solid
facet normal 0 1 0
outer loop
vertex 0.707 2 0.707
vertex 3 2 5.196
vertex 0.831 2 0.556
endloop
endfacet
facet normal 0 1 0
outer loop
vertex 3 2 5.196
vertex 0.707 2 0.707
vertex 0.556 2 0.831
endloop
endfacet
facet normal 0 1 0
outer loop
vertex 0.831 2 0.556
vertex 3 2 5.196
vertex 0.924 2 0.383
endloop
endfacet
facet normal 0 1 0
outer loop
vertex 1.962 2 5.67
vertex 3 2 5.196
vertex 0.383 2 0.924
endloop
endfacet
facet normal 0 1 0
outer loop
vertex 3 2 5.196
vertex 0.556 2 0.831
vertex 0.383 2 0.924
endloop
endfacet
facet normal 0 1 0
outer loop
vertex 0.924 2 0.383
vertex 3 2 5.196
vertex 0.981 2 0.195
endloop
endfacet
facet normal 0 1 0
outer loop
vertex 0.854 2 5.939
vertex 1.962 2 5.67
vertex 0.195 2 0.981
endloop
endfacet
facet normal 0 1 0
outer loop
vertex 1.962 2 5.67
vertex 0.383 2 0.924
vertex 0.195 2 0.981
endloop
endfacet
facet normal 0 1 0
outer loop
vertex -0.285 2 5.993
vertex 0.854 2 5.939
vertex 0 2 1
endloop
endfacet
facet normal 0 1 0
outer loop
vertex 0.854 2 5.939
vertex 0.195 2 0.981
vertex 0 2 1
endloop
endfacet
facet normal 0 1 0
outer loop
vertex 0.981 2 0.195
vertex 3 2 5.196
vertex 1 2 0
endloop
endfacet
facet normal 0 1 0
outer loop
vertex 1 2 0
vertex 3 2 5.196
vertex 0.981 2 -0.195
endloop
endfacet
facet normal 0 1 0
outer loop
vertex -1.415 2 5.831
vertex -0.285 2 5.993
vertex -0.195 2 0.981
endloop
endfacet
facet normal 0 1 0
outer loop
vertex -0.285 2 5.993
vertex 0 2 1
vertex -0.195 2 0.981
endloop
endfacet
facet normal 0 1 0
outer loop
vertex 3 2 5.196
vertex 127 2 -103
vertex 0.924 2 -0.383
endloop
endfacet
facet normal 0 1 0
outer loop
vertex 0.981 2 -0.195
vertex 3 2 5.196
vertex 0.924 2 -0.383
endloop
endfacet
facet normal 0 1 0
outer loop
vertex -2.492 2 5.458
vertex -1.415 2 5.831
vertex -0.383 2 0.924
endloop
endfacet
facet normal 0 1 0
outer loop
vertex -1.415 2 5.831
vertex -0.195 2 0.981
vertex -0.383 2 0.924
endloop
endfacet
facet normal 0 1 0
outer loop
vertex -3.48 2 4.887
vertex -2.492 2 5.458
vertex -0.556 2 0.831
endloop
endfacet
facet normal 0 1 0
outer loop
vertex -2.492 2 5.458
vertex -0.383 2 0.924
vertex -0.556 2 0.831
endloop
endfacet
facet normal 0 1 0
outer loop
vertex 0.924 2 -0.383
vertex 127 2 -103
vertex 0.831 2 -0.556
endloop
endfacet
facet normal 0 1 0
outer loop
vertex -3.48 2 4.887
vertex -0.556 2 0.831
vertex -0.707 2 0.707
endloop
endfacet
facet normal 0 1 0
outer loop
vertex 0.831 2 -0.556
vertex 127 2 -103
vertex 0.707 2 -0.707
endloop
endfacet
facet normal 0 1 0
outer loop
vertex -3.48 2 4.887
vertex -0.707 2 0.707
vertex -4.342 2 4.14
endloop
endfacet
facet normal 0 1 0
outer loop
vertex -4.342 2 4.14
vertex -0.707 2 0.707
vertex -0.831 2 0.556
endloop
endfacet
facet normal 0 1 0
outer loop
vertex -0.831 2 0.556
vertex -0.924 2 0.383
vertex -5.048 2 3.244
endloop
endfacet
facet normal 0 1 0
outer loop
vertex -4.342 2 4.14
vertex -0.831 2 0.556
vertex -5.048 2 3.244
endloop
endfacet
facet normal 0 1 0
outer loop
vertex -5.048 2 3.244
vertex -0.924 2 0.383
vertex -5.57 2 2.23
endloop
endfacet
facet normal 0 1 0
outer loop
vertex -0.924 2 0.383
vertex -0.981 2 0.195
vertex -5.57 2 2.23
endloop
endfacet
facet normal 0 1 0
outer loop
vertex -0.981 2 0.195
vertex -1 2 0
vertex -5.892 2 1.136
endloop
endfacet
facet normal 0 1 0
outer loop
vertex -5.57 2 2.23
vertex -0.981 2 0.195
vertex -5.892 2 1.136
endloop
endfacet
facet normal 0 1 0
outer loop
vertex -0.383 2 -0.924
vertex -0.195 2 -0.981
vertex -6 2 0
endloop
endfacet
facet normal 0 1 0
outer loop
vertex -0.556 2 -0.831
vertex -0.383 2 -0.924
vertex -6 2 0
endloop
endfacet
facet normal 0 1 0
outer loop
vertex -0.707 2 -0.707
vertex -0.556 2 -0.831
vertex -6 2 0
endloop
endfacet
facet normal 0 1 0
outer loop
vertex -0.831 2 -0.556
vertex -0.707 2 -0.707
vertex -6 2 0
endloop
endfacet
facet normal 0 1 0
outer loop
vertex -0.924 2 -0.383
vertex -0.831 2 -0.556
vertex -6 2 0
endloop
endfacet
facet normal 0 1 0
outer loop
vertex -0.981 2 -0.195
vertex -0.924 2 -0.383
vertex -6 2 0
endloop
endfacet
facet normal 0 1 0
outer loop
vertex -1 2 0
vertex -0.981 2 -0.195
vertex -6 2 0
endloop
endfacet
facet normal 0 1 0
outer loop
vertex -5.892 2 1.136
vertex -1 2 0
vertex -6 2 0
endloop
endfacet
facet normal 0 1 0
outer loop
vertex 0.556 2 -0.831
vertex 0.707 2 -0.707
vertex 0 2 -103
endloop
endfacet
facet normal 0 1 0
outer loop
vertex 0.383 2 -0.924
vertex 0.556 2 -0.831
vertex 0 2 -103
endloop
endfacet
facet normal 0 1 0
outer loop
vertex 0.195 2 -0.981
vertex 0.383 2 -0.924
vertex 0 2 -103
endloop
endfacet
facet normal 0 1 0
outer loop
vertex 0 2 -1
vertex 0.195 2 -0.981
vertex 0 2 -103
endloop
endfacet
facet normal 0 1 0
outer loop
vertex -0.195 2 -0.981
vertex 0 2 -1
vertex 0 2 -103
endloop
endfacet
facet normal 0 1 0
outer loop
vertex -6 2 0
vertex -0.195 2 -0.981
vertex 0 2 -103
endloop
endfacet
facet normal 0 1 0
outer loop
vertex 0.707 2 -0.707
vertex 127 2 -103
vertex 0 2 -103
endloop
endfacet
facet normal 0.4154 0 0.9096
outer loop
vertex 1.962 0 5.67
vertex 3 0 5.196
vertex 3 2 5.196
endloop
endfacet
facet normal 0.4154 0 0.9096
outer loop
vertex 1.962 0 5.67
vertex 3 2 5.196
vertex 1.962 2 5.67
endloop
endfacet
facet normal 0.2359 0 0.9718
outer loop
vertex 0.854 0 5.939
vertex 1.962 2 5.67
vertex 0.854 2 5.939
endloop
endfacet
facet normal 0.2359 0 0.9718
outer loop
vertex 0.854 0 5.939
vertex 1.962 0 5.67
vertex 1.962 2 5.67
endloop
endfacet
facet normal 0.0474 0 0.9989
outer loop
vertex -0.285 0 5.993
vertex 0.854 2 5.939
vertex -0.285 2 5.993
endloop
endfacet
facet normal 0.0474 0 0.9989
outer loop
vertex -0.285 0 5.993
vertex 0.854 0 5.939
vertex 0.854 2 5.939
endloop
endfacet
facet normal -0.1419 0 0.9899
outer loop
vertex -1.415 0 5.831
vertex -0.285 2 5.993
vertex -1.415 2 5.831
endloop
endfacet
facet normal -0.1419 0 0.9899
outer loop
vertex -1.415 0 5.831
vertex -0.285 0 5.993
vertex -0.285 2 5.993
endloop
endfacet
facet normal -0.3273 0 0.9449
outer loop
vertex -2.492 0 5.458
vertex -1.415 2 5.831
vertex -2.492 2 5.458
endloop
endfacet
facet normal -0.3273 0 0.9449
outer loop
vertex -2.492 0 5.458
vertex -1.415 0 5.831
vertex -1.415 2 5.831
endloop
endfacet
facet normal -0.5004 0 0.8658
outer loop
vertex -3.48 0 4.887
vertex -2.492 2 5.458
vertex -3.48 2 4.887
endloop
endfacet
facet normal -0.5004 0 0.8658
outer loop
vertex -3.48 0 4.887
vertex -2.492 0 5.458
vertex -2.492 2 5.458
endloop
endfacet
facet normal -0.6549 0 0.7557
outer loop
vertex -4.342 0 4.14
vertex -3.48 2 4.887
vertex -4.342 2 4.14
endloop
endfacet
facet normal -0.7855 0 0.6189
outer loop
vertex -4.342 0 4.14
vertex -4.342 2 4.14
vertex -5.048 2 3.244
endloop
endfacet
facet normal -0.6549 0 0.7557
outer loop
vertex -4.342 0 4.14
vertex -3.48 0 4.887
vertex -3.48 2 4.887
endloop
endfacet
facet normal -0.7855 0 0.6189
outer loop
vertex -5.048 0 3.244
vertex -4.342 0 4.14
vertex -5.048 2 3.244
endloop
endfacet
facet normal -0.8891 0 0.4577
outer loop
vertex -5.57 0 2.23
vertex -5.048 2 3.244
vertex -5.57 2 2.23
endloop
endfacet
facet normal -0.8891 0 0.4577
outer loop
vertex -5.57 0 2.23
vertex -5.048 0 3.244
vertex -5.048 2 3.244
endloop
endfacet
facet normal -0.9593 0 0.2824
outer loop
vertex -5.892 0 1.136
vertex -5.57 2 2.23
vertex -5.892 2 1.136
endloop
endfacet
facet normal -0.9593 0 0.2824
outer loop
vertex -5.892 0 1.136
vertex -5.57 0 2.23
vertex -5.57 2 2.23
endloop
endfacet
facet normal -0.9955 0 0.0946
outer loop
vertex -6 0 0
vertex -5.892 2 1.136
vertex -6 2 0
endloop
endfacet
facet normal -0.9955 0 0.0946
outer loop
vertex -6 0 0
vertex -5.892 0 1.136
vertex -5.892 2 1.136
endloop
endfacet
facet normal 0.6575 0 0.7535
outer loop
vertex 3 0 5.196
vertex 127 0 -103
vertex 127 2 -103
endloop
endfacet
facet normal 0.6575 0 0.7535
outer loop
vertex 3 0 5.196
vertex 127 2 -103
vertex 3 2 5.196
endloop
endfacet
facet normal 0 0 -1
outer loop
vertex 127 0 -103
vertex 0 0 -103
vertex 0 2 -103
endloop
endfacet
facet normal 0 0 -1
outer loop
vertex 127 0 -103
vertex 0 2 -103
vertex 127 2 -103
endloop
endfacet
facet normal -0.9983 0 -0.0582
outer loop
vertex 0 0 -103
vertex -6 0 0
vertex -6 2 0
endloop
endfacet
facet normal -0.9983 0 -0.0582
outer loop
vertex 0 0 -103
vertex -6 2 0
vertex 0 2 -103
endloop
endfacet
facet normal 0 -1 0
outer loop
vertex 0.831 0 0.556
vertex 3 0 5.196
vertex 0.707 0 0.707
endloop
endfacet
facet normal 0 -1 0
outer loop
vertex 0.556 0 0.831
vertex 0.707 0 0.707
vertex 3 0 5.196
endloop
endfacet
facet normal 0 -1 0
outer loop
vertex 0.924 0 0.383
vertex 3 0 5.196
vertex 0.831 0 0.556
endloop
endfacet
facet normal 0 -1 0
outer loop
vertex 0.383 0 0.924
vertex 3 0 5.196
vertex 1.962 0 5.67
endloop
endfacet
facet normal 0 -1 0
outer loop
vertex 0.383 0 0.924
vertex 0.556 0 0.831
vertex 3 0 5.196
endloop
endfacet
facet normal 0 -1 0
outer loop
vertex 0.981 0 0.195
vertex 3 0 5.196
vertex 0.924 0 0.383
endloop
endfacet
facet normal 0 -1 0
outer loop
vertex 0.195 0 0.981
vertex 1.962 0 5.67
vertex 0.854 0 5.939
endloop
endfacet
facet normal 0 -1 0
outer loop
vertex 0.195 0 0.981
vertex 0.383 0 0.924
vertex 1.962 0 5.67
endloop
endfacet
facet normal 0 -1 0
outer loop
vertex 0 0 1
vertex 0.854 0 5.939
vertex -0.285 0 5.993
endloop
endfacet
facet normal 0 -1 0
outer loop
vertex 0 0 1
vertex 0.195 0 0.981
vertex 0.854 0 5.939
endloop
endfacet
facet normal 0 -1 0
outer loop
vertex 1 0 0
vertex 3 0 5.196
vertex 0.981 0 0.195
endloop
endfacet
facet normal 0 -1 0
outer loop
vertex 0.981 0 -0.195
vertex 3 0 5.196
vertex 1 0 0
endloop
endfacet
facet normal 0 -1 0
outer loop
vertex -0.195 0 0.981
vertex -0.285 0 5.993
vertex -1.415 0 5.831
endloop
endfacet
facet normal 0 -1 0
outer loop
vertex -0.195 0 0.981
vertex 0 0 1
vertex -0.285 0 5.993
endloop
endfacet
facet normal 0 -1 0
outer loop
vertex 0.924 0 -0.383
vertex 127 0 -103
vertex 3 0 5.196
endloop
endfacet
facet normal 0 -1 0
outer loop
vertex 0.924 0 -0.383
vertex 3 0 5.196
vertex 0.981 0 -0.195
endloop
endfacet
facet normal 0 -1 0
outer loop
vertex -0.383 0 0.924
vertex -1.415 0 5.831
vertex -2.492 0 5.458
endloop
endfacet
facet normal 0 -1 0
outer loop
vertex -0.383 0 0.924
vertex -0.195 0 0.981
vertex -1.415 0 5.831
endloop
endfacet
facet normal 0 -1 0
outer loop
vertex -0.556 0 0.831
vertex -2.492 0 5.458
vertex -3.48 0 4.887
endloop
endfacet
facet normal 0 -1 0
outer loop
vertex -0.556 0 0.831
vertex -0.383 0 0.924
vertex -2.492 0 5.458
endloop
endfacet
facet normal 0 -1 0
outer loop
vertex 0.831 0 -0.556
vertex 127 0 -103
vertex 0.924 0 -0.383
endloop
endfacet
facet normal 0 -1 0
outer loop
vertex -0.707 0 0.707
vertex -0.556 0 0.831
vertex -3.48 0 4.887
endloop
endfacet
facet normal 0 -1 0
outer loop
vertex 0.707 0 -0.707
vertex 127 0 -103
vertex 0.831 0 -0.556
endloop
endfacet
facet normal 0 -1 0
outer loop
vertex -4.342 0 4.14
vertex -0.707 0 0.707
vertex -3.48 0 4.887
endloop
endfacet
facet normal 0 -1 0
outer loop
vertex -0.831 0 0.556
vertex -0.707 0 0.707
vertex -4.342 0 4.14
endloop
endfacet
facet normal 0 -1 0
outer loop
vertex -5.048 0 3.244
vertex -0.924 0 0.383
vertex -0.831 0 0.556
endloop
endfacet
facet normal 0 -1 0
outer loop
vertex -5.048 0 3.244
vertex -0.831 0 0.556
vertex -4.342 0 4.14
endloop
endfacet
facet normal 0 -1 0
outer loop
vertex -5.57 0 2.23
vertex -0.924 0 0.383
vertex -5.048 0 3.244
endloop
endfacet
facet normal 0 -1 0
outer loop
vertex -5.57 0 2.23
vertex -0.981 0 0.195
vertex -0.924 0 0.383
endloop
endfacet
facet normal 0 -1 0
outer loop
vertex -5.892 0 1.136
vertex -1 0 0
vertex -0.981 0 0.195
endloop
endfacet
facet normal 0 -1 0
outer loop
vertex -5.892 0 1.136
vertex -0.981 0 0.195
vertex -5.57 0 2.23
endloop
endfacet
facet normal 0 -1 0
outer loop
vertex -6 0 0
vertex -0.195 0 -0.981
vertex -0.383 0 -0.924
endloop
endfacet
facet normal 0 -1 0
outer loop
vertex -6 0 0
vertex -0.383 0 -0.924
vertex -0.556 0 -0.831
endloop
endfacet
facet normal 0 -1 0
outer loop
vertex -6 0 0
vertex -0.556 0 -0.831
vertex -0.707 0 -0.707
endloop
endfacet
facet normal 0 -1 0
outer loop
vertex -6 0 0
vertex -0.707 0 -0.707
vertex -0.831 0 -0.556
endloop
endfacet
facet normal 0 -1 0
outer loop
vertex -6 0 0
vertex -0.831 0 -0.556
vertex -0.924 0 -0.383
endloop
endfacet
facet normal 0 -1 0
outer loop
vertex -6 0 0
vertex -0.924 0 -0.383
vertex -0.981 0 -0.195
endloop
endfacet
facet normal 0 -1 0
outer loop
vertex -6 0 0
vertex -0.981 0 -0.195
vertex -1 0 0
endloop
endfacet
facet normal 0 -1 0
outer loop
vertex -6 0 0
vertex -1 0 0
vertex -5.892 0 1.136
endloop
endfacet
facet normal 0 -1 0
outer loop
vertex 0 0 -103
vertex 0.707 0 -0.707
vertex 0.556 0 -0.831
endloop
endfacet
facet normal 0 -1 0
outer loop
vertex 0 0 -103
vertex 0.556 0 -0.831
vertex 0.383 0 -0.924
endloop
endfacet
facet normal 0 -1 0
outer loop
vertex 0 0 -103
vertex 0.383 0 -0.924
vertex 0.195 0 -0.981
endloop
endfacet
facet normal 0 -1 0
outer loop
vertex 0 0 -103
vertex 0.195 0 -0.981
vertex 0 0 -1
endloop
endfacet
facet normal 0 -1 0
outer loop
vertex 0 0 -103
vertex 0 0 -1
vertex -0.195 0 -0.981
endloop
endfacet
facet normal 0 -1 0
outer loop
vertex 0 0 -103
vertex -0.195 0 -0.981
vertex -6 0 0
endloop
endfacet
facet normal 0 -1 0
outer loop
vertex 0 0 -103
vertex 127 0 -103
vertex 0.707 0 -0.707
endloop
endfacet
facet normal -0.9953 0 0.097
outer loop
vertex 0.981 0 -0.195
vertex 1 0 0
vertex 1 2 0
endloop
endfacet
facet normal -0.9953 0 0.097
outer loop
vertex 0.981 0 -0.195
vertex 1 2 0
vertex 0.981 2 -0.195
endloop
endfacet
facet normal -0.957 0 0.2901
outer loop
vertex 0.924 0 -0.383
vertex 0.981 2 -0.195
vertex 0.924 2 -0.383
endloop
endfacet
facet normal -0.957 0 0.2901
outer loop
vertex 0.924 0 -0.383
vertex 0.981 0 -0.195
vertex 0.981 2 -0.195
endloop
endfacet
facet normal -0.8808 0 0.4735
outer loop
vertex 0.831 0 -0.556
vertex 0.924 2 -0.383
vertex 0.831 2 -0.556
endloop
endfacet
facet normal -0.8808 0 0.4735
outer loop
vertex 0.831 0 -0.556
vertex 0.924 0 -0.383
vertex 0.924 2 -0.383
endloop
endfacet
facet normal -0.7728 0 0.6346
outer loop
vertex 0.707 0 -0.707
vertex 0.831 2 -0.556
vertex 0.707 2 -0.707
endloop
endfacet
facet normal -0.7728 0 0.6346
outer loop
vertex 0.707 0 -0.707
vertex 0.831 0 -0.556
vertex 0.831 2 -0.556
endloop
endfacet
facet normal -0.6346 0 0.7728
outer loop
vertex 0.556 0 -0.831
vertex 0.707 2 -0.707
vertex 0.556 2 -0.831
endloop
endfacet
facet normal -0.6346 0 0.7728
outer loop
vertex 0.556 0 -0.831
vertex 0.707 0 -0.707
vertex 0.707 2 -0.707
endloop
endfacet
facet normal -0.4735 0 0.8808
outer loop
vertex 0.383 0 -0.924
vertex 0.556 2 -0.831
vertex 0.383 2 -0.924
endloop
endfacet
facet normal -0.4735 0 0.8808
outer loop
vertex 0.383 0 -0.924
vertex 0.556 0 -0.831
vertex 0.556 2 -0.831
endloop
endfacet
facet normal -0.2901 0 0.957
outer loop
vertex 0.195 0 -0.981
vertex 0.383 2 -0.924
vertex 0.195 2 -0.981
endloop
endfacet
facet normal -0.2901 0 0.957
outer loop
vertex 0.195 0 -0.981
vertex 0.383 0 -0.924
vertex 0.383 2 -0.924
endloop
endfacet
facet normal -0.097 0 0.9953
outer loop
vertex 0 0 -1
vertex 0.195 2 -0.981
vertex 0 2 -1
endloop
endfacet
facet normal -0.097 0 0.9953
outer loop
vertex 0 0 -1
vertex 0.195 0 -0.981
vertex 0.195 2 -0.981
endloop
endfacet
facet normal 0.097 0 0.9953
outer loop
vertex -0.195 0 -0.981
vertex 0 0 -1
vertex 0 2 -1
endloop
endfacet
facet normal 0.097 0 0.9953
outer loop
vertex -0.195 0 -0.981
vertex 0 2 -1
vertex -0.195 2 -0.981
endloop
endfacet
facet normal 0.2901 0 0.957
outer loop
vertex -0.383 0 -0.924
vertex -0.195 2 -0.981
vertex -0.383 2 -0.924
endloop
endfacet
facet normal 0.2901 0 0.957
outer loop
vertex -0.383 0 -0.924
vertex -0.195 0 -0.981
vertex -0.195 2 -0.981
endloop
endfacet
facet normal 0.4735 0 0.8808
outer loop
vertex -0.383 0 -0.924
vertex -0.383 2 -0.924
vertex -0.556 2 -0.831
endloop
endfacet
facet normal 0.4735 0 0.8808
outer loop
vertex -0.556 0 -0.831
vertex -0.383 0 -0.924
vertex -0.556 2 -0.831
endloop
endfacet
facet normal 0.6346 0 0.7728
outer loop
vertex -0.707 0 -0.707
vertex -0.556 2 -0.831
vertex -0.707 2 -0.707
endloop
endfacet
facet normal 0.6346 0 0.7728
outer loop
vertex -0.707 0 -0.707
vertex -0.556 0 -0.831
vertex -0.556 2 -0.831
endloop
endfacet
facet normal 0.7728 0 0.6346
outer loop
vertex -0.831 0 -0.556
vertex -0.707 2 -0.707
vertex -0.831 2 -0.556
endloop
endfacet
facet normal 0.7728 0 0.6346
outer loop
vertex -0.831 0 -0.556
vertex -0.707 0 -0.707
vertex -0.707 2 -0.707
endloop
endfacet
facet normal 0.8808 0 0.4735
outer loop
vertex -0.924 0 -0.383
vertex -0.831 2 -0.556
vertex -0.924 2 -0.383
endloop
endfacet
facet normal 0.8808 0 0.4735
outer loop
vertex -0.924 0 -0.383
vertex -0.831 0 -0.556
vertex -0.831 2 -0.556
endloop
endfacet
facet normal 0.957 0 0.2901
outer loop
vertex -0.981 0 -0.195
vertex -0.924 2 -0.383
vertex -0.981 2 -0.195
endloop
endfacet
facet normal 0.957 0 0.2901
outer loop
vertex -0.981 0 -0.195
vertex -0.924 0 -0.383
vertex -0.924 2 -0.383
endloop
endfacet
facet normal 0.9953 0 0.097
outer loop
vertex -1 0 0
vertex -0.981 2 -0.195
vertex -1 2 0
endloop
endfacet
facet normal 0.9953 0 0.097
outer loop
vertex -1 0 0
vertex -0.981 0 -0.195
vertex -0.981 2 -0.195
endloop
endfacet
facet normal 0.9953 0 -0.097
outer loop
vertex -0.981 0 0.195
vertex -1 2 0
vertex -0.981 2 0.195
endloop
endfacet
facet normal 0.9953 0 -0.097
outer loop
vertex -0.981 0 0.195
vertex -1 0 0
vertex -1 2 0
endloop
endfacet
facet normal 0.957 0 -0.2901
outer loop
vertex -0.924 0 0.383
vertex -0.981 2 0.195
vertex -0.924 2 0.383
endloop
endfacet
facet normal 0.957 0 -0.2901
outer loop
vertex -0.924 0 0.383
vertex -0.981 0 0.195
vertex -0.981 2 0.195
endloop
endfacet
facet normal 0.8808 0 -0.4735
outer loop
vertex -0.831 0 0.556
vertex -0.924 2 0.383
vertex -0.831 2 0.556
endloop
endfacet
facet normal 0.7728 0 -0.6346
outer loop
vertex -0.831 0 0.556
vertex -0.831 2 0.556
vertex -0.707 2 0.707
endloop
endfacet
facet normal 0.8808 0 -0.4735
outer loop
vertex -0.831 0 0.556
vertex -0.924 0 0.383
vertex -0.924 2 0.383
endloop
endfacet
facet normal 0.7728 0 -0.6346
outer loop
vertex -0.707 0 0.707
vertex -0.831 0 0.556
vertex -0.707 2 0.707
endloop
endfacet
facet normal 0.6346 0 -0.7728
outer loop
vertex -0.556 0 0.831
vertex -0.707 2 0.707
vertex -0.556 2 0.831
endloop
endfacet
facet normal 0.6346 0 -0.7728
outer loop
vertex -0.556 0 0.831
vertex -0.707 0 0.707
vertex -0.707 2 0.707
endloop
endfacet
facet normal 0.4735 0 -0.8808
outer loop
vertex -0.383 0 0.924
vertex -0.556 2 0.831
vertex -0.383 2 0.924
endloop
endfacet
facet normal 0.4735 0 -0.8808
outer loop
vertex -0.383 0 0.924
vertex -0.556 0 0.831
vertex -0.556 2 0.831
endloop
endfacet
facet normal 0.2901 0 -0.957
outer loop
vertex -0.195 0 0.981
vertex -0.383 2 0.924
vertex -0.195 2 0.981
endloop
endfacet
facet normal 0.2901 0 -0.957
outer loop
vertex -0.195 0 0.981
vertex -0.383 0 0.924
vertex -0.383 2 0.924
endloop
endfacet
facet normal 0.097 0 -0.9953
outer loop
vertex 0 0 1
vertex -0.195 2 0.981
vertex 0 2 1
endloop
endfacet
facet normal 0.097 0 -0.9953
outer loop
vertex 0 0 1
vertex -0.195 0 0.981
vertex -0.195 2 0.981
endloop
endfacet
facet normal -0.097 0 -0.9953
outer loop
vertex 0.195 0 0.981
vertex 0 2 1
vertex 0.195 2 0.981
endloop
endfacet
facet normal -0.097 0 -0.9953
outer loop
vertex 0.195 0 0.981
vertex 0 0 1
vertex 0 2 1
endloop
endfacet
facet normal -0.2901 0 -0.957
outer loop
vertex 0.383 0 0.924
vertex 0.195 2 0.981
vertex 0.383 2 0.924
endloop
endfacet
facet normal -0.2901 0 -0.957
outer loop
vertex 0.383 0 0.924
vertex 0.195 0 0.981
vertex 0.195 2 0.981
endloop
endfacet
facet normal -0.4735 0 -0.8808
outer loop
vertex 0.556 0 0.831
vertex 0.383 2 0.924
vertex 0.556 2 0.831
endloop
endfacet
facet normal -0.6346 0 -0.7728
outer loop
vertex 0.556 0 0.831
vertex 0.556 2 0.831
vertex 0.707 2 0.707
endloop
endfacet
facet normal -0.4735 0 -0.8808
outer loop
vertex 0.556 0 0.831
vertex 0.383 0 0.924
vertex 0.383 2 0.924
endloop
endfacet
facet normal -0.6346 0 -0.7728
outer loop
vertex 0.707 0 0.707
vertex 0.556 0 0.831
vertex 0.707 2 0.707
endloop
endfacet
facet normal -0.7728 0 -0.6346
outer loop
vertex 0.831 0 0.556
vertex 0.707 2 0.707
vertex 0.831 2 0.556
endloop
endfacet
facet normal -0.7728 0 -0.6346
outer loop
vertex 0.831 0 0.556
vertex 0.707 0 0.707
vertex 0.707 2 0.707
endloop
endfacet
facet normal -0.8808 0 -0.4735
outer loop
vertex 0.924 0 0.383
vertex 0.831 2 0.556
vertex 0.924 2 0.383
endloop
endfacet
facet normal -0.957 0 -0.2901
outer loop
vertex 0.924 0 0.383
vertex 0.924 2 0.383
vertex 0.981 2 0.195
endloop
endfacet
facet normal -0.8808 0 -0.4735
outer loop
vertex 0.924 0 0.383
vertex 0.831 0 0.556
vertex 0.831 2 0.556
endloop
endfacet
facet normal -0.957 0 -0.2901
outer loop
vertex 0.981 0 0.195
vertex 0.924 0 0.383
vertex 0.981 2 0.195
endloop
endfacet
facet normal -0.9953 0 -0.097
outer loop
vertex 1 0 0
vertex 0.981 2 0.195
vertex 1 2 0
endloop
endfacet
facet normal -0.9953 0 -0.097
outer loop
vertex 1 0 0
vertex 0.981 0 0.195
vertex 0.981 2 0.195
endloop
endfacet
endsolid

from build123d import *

# Parameters (mm, degrees)
ESQUISSE1_R        = 1
BOSS_EXTRU_2_DEPTH = 2


with BuildPart() as part:
    # Esquisse1 → Boss.-Extru.2 (new body)
    with BuildSketch(Plane(origin=(0, 0, 0), x_dir=(1, 0, 0), z_dir=(0, 1, 0))):
        with BuildLine():
            Line((0, 103), (127, 103))
            Line((127, 103), (3, -5.196152423))
            ThreePointArc((3, -5.196152423), (-3, -5.196152423), (-6, 0))
            Line((-6, 0), (0, 103))
        make_face()
        Circle(ESQUISSE1_R, mode=Mode.SUBTRACT)
    extrude(amount=BOSS_EXTRU_2_DEPTH)


solid = part.part
